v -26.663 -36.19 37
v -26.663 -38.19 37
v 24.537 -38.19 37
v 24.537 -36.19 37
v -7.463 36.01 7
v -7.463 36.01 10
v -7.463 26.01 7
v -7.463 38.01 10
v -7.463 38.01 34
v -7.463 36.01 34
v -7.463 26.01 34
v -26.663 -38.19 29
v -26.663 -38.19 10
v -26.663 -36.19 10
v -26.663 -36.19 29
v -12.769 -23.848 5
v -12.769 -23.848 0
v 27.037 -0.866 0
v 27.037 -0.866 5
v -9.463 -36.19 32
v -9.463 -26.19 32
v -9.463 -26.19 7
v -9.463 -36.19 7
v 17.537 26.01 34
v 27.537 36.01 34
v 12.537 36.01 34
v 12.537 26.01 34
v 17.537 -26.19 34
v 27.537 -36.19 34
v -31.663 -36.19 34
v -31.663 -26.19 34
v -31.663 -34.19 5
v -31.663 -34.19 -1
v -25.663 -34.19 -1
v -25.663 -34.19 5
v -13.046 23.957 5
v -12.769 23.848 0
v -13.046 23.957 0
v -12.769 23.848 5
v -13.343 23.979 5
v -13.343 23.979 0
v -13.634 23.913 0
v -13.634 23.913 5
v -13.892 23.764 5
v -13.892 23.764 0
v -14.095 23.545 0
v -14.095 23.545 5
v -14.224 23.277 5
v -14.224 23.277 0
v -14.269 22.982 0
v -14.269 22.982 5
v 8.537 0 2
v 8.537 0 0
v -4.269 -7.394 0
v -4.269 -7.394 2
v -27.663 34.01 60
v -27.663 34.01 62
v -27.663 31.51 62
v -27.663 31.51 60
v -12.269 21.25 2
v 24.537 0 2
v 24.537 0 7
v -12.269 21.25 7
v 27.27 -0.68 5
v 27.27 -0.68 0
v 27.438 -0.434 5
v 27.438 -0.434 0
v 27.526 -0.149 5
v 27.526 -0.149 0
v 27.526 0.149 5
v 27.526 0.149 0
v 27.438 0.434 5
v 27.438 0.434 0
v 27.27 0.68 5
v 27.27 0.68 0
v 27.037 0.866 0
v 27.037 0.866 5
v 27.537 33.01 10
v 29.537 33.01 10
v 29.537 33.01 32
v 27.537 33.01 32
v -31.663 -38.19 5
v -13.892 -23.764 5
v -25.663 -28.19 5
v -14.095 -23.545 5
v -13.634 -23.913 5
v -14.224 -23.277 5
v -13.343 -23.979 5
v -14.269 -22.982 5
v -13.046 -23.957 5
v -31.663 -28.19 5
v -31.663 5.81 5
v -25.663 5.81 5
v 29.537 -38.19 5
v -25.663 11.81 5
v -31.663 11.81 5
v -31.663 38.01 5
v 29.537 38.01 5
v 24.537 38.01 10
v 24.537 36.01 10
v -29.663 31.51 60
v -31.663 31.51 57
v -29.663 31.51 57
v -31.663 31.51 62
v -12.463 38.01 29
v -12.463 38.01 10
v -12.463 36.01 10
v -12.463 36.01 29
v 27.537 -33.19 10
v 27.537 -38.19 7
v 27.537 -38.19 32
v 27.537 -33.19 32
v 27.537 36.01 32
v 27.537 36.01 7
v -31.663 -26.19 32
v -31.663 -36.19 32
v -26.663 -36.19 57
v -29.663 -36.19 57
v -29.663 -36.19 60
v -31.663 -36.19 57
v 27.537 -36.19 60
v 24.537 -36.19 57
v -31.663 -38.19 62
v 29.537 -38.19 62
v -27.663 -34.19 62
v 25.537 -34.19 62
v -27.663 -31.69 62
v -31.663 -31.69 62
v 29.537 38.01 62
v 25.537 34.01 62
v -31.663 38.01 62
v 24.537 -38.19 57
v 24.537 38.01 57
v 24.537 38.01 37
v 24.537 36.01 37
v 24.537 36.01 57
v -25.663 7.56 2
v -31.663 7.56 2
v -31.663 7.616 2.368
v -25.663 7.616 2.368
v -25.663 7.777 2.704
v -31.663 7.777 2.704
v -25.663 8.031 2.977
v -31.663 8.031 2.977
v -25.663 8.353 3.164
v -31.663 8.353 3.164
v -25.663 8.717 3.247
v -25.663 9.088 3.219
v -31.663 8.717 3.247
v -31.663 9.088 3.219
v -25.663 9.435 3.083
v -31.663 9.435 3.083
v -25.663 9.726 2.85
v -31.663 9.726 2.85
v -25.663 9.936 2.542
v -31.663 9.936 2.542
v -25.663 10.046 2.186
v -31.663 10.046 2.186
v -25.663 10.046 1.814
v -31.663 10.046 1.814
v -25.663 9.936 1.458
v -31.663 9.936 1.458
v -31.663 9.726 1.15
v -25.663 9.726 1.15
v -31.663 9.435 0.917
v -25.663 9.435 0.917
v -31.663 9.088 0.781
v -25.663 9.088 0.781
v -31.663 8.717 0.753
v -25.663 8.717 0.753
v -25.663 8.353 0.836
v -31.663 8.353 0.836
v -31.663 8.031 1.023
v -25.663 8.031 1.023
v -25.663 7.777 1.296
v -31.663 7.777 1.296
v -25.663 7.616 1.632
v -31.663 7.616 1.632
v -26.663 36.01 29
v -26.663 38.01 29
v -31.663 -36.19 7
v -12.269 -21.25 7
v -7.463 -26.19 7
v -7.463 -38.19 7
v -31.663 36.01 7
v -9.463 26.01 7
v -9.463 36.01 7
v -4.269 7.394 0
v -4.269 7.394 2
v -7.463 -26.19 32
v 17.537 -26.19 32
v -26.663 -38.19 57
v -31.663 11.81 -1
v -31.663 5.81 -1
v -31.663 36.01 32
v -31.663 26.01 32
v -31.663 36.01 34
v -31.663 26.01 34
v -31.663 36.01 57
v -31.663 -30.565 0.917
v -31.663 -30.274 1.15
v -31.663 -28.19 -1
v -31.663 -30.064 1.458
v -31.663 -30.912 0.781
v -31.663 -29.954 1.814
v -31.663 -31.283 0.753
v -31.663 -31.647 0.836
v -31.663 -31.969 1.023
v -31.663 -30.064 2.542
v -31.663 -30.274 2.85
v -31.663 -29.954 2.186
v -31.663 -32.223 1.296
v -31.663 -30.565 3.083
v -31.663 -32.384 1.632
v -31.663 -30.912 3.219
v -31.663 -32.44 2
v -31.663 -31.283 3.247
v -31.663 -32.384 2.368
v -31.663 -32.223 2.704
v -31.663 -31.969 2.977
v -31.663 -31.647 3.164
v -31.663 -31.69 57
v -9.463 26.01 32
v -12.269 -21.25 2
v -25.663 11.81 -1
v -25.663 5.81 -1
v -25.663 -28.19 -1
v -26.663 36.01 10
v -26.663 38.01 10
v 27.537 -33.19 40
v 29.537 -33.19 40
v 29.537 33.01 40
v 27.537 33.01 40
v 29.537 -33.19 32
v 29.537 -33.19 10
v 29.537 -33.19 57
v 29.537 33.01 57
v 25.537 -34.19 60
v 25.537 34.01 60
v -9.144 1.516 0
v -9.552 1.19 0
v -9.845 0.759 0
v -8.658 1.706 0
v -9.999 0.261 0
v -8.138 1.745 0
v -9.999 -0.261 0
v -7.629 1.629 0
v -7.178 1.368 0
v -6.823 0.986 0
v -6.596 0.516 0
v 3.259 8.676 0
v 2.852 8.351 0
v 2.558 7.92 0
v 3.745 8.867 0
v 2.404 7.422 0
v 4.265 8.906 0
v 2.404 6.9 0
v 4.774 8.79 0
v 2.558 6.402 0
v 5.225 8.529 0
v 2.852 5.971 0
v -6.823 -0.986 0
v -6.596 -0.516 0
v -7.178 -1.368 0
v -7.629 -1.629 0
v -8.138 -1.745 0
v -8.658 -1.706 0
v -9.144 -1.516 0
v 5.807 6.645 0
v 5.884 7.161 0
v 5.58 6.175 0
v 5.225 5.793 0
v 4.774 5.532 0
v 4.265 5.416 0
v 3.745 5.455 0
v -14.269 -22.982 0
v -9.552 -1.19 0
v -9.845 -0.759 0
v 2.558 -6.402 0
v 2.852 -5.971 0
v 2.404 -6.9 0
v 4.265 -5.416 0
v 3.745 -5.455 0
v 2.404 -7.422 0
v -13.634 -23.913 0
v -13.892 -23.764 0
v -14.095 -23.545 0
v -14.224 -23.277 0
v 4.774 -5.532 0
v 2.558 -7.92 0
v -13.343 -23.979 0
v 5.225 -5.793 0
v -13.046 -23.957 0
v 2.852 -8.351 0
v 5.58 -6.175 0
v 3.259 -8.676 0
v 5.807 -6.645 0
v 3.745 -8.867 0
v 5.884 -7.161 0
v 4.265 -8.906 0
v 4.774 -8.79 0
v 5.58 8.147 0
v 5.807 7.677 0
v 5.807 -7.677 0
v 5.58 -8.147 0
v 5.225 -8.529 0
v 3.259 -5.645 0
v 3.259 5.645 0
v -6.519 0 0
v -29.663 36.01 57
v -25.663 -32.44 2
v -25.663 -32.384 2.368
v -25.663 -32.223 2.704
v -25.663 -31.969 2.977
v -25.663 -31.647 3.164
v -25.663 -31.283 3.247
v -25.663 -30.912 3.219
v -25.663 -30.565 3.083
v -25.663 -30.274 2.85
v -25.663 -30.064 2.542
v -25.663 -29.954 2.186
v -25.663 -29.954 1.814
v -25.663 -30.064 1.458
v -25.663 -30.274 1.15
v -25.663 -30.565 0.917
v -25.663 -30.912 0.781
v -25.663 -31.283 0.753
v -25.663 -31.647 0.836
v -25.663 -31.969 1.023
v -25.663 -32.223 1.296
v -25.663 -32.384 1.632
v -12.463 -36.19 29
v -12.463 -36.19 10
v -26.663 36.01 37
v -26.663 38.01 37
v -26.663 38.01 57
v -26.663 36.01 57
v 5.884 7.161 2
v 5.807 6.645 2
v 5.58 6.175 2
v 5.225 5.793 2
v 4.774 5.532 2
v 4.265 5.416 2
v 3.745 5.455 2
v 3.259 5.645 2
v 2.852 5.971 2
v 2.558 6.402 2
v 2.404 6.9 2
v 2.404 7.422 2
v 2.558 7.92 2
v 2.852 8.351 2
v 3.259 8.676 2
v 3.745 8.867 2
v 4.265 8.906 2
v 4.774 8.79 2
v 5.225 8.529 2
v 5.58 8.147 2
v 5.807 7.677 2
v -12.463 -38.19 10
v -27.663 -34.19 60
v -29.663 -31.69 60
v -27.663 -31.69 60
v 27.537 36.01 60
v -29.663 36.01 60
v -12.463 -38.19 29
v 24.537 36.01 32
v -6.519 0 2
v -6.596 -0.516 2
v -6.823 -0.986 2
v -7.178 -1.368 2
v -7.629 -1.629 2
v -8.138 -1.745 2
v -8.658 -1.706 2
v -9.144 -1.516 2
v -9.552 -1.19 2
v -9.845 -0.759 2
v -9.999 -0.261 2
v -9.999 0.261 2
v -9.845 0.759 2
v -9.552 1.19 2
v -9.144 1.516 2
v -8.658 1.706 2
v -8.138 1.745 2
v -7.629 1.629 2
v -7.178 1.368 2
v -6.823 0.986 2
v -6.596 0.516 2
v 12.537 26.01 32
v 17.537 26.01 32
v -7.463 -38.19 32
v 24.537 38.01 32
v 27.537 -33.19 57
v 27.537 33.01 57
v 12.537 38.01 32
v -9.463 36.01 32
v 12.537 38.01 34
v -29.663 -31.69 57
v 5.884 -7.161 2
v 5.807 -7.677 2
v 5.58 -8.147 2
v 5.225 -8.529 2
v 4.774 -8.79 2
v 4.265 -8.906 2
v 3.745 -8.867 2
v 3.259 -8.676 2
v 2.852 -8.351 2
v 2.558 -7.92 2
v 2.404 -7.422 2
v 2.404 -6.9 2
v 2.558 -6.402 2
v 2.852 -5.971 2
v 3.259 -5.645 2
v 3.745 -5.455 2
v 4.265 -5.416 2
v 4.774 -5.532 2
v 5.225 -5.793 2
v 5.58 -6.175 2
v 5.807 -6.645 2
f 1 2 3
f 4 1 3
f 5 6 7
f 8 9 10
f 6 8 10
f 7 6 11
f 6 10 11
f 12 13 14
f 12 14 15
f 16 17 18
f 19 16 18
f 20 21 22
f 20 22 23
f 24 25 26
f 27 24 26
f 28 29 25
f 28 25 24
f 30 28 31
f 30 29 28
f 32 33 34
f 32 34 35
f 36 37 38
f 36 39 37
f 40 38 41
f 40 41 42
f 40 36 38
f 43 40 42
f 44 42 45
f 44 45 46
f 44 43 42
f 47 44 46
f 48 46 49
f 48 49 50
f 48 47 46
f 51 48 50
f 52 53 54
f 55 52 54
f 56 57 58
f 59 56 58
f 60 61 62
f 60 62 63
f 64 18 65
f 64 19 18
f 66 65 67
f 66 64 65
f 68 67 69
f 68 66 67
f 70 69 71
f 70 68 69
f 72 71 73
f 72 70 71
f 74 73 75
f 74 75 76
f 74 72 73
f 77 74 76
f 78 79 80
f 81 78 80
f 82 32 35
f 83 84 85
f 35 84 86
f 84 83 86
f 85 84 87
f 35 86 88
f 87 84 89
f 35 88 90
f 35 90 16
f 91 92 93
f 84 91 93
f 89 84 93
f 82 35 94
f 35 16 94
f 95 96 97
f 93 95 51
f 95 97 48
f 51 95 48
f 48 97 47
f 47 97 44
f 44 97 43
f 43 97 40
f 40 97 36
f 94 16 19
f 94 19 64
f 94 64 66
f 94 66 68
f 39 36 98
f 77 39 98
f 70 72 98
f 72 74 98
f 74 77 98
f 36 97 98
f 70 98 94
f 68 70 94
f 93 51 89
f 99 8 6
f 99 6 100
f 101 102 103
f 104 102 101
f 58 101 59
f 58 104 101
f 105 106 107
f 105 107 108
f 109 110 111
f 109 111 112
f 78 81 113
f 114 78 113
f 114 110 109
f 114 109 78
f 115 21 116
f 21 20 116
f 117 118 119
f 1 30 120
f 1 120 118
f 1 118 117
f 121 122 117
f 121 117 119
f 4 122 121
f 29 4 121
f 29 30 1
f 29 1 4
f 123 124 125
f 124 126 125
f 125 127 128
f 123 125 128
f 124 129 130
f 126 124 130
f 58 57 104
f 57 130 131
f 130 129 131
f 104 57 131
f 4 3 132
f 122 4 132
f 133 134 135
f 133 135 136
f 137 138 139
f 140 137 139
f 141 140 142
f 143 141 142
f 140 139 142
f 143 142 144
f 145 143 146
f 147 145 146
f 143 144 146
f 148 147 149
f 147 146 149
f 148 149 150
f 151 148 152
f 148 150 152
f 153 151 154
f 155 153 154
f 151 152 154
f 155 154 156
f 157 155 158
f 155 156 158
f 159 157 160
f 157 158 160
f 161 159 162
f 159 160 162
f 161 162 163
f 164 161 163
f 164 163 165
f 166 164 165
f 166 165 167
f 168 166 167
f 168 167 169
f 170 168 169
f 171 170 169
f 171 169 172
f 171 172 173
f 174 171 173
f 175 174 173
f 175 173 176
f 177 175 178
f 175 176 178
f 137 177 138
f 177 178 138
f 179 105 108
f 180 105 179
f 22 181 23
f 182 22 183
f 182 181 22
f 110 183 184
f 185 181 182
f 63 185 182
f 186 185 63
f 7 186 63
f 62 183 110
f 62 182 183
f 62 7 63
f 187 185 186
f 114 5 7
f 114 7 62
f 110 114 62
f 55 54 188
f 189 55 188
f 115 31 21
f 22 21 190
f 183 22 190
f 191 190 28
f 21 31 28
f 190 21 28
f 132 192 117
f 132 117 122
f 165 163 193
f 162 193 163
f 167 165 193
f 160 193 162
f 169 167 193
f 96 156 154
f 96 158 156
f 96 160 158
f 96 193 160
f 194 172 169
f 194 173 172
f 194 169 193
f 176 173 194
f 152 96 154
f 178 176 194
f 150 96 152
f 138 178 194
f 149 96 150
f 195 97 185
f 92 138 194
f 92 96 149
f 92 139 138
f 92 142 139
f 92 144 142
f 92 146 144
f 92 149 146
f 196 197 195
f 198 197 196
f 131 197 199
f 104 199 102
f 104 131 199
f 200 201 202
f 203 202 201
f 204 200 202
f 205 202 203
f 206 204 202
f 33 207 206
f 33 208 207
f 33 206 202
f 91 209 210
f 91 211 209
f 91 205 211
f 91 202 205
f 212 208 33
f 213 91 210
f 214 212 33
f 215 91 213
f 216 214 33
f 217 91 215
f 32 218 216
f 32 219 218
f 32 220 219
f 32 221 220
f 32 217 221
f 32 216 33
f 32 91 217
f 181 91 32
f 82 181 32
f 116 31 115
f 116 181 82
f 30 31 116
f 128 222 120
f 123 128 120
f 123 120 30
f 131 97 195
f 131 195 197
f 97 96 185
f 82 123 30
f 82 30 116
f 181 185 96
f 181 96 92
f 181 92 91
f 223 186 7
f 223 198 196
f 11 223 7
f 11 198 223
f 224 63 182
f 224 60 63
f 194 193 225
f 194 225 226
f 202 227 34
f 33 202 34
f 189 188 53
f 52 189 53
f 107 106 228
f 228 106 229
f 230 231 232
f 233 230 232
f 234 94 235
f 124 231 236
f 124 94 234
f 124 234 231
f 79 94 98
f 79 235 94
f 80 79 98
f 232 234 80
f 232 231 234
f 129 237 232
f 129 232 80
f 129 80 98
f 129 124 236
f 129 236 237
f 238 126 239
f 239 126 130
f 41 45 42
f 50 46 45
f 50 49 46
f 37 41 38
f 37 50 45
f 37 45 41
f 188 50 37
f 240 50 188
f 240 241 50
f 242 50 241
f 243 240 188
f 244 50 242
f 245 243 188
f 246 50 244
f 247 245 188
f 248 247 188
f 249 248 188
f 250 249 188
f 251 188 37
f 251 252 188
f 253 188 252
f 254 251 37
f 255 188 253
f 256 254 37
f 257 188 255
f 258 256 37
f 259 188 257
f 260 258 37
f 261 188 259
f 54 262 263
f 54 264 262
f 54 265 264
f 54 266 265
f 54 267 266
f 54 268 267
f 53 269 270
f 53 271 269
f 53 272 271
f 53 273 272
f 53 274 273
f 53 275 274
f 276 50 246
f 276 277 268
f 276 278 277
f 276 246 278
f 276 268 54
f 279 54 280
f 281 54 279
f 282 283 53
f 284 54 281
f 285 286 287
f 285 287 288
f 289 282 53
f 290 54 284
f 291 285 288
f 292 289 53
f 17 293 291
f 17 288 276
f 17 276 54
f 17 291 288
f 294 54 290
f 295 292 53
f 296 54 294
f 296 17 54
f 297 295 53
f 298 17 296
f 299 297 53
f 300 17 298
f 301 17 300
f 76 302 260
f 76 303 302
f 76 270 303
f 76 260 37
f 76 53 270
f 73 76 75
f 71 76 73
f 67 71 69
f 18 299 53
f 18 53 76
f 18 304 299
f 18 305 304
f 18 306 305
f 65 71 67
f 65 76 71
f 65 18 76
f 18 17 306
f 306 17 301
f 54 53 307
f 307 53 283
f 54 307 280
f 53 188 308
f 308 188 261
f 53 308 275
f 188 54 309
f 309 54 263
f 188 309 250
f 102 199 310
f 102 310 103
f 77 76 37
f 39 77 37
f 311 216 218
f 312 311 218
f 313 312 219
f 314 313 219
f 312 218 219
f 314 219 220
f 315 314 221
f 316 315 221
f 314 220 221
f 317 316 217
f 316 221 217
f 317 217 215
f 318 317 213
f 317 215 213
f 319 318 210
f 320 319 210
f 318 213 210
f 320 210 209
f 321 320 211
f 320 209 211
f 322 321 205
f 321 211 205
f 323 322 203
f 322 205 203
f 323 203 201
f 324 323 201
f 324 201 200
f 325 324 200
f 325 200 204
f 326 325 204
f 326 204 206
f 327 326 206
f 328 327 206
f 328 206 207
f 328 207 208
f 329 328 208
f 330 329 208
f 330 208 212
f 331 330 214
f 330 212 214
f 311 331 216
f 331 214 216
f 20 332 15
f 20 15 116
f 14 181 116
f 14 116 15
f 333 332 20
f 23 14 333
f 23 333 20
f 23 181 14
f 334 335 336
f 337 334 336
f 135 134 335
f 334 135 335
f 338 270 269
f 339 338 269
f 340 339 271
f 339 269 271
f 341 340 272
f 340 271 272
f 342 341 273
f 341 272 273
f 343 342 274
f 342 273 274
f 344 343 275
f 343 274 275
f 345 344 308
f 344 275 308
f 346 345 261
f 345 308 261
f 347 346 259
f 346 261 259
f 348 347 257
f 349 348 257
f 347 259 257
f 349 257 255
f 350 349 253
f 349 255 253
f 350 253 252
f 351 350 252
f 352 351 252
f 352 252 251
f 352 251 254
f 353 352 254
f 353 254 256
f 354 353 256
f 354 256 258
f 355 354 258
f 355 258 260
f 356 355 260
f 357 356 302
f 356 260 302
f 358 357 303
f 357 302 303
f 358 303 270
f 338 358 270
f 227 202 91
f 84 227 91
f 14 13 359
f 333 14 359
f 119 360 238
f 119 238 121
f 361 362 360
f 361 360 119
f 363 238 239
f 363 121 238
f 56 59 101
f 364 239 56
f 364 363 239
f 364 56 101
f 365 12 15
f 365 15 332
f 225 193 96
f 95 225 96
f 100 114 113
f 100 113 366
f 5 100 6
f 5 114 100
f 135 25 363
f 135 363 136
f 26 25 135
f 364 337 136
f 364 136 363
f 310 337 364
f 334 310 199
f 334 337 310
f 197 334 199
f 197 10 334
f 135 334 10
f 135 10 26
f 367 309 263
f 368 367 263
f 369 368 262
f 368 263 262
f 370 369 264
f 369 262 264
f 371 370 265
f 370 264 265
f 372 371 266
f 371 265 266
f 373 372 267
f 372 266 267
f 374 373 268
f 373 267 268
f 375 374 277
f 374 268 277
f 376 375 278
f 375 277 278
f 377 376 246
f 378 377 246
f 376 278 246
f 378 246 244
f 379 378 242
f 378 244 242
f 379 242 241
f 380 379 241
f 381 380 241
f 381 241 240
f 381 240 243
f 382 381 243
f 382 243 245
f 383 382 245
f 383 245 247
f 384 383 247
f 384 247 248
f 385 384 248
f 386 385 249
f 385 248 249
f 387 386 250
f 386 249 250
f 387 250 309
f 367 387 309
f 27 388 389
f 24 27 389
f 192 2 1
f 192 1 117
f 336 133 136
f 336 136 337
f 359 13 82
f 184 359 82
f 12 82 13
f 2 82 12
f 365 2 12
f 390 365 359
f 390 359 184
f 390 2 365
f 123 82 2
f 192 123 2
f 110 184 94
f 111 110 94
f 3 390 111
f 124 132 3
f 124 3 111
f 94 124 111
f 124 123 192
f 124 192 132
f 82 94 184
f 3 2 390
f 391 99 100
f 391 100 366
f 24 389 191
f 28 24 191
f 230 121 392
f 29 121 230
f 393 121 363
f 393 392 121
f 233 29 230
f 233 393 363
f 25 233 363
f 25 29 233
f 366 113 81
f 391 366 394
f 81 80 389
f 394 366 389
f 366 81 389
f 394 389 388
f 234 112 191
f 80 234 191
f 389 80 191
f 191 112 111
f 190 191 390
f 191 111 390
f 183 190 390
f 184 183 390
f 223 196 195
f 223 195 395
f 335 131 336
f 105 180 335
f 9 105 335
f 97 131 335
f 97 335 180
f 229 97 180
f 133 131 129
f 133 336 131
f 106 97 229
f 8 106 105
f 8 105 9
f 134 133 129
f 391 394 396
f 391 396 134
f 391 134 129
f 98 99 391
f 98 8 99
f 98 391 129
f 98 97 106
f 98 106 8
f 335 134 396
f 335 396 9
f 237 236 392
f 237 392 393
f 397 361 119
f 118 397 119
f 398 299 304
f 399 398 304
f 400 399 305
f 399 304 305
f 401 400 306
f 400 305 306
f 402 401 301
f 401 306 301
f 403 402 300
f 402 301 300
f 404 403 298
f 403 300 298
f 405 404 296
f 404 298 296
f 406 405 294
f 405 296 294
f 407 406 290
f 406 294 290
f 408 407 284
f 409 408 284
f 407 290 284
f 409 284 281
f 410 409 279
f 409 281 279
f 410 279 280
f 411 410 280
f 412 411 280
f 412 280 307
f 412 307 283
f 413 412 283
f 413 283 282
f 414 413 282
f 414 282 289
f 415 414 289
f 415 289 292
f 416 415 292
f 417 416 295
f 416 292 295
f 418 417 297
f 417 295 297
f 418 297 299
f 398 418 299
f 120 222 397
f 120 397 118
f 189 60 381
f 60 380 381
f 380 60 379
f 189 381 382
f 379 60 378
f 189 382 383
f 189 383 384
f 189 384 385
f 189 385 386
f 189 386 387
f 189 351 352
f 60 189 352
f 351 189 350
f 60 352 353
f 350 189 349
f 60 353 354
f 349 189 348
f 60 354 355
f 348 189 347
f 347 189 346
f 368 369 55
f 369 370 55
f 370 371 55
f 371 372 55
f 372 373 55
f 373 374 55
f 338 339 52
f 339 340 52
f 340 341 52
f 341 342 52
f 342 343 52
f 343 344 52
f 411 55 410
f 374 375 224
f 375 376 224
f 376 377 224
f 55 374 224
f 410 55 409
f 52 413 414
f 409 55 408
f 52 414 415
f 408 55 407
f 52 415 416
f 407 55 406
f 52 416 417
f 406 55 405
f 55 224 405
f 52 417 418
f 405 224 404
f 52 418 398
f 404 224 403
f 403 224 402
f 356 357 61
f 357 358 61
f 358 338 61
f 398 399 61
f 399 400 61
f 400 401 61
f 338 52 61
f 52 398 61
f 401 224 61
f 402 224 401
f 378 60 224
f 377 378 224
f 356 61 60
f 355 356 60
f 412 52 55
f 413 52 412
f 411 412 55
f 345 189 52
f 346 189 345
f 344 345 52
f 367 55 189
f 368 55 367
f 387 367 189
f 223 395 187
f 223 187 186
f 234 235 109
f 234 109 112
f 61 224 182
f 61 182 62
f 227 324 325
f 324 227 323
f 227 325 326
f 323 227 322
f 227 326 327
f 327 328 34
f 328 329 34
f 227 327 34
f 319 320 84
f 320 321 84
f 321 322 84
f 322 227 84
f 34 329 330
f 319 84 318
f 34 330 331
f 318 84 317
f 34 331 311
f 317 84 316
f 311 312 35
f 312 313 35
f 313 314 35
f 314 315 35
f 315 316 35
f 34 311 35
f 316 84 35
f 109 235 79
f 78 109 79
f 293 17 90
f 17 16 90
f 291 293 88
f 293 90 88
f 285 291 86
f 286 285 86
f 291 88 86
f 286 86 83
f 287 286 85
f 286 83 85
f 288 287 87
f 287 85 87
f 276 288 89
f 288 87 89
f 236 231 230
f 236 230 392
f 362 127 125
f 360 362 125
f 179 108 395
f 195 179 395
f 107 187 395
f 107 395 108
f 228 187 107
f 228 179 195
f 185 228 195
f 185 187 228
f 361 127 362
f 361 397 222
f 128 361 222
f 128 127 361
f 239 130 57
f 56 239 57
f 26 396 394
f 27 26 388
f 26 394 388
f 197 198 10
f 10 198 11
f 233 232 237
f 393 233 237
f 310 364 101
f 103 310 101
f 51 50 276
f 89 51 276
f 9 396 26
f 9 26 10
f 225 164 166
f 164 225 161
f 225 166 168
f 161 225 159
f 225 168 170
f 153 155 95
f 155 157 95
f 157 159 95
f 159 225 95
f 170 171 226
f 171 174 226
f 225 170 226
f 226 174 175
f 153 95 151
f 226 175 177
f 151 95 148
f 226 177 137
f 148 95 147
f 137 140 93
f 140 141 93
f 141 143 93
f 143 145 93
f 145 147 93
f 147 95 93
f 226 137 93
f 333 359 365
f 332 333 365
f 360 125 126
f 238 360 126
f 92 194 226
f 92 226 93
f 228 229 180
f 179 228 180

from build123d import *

# Parameters (mm, degrees)
PAD_DEPTH       = 5
FILLET_R        = 1
FILLET001_R     = 1
FILLET002_R     = 1
SKETCH001_R     = 1.75
PAD001_DEPTH    = 2
SKETCH002_W     = 61.2
SKETCH002_H     = 76.2
PAD002_DEPTH    = 2
PAD003_DEPTH    = 55
SKETCH004_W     = 35
SKETCH004_H     = 25
SKETCH004_W_2   = 14.2
SKETCH004_H_2   = 19
SKETCH004_W_3   = 51.2
SKETCH004_H_3   = 20
POCKET_DEPTH    = 2
SKETCH005_W     = 14.2
SKETCH005_H     = 19
SKETCH005_W_2   = 51.2
SKETCH005_H_2   = 20
POCKET001_DEPTH = 2
SKETCH006_W     = 66.2
SKETCH006_H     = 22
SKETCH006_H_2   = 17
POCKET002_DEPTH = 2
SKETCH007_W     = 24.2
SKETCH007_H     = 10
SKETCH007_W_2   = 31.5
SKETCH007_H_2   = 12
SKETCH007_R     = 1.25
PAD004_DEPTH    = 2
SKETCH008_W     = 31.5
SKETCH008_H     = 2
PAD005_DEPTH    = 3
PAD006_DEPTH    = 2
SKETCH010_W     = 5
SKETCH010_H     = 3
PAD007_DEPTH    = 2
SKETCH011_W     = 6
SKETCH011_H     = 6
SKETCH011_R     = 1.25
PAD008_DEPTH    = 6
SKETCH012_W     = 2
SKETCH012_H     = 10
PAD009_DEPTH    = 25
SKETCH013_W     = 31.5
SKETCH013_H     = 76.2
POCKET003_DEPTH = 6
SKETCH014_W     = 4
SKETCH014_H     = 5
POCKET004_DEPTH = 0.5
SKETCH015_W     = 4
SKETCH015_H     = 5
POCKET005_DEPTH = 0.5


with BuildPart() as part:
    # Sketch → Pad (new body)
    with BuildSketch(Plane.XY):
        Polygon((28.537386, 0), (-14.268693, 24.714102), (-14.268693, -24.714102), align=None)
        Polygon((24.537386, 0), (-12.268693, 21.25), (-12.268693, -21.25), align=None, mode=Mode.SUBTRACT)
    extrude(amount=PAD_DEPTH)

    # Fillet
    fillet_edges = [part.edges().sort_by_distance(p)[0] for p in [
        (-14.268693, -24.714102, 2.5),
    ]]
    fillet(fillet_edges, radius=FILLET_R)

    # Fillet001
    fillet001_edges = [part.edges().sort_by_distance(p)[0] for p in [
        (28.537386, 0, 2.5),
    ]]
    fillet(fillet001_edges, radius=FILLET001_R)

    # Fillet002
    fillet002_edges = [part.edges().sort_by_distance(p)[0] for p in [
        (-14.268693, 24.714102, 2.5),
    ]]
    fillet(fillet002_edges, radius=FILLET002_R)

    # Sketch001 (on Face1 of Fillet002) → Pad001 (join)
    with BuildSketch(Plane(origin=(0, 0, 0), x_dir=(1, 0, 0), z_dir=(0, 0, -1))):
        Polygon((24.537386, 0), (-12.268693, 21.25), (-12.268693, -21.25), align=None)
        with Locations((4.134347, 7.160898)):
            Circle(SKETCH001_R, mode=Mode.SUBTRACT)
        with Locations((4.134347, -7.160898)):
            Circle(SKETCH001_R, mode=Mode.SUBTRACT)
        with Locations((-8.268693, 0)):
            Circle(SKETCH001_R, mode=Mode.SUBTRACT)
        Polygon((8.537386, 0), (-4.268693, 7.393594), (-4.268693, -7.393594), align=None, mode=Mode.SUBTRACT)
    extrude(amount=-PAD001_DEPTH)

    # Sketch002 (on Face9 of Pad001) → Pad002 (join)
    with BuildSketch(Plane.XY.offset(5)):
        with Locations((-1.062614, -0.09)):
            Rectangle(SKETCH002_W, SKETCH002_H)
        Polygon((-12.268693, 21.25), (-12.268693, -21.25), (24.537386, 0), align=None, mode=Mode.SUBTRACT)
    extrude(amount=PAD002_DEPTH)

    # Sketch003 (on Face21 of Pad002) → Pad003 (join)
    with BuildSketch(Plane.XY.offset(7)):
        Polygon((-31.662614, 38.01), (29.537386, 38.01), (29.537386, -38.19), (-31.662614, -38.19), (-31.662614, -36.19), (27.537386, -36.19), (27.537386, 36.01), (-31.662614, 36.01), align=None)
    extrude(amount=PAD003_DEPTH)

    # Sketch004 (on Face26 of Pad003) → Pocket (cut)
    with BuildSketch(Plane.XZ.offset(38.19)):
        with Locations((10.037386, 19.5)):
            Rectangle(SKETCH004_W, SKETCH004_H)
        with Locations((-19.562614, 19.5)):
            Rectangle(SKETCH004_W_2, SKETCH004_H_2)
        with Locations((-1.062614, 47)):
            Rectangle(SKETCH004_W_3, SKETCH004_H_3)
    extrude(amount=-POCKET_DEPTH, mode=Mode.SUBTRACT)

    # Sketch005 (on Face21 of Pocket) → Pocket001 (cut)
    with BuildSketch(Plane(origin=(0, 38.01, 0), x_dir=(-1, 0, 0), z_dir=(0, 1, 0))):
        Polygon((-24.537386, 32), (-12.537386, 32), (-12.537386, 34), (7.462614, 34), (7.462614, 32), (7.462614, 10), (-24.537386, 10), align=None)
        with Locations((19.562614, 19.5)):
            Rectangle(SKETCH005_W, SKETCH005_H)
        with Locations((1.062614, 47)):
            Rectangle(SKETCH005_W_2, SKETCH005_H_2)
    extrude(amount=-POCKET001_DEPTH, mode=Mode.SUBTRACT)

    # Sketch006 (on Face25 of Pocket001) → Pocket002 (cut)
    with BuildSketch(Plane.YZ.offset(29.537386)):
        with Locations((-0.09, 21)):
            Rectangle(SKETCH006_W, SKETCH006_H)
        with Locations((-0.09, 48.5)):
            Rectangle(SKETCH006_W, SKETCH006_H_2)
    extrude(amount=-POCKET002_DEPTH, mode=Mode.SUBTRACT)

    # Sketch007 (on Face62 of Pocket002) → Pad004 (join)
    with BuildSketch(Plane(origin=(0, 0, 32), x_dir=(1, 0, 0), z_dir=(0, 0, -1))):
        Polygon((-31.662614, 36.19), (27.537386, 36.19), (27.537386, -36.01), (12.537386, -36.01), (12.537386, -26.01), (17.537386, -26.01), (17.537386, 26.19), (-31.662614, 26.19), align=None)
        with Locations((-19.562614, -31.01)):
            Rectangle(SKETCH007_W, SKETCH007_H)
        with Locations((45.287386, -32.01)):
            Rectangle(SKETCH007_W_2, SKETCH007_H_2)
        with Locations((58.037386, -32.91)):
            Circle(SKETCH007_R, mode=Mode.SUBTRACT)
        with Locations((32.037386, -32.91)):
            Circle(SKETCH007_R, mode=Mode.SUBTRACT)
        with Locations((45.287386, 32.19)):
            Rectangle(SKETCH007_W_2, SKETCH007_H_2)
        with Locations((32.037386, 33.09)):
            Circle(SKETCH007_R, mode=Mode.SUBTRACT)
        with Locations((58.037386, 33.09)):
            Circle(SKETCH007_R, mode=Mode.SUBTRACT)
    extrude(amount=-PAD004_DEPTH)

    # Sketch008 (on Face78 of Pad004) → Pad005 (join, symmetric)
    with BuildSketch(Plane.XY.offset(34)):
        with Locations((45.287386, 37.01)):
            Rectangle(SKETCH008_W, SKETCH008_H)
        with Locations((45.287386, -37.19)):
            Rectangle(SKETCH008_W, SKETCH008_H)
    extrude(amount=PAD005_DEPTH, both=True)

    # Sketch009 (on Face31 of Pad005) → Pad006 (join)
    with BuildSketch(Plane.XY.offset(62)):
        Polygon((-31.662614, 36.01), (27.537386, 36.01), (27.537386, -36.19), (-31.662614, -36.19), (-31.662614, -34.19), (-31.662614, -31.19), (-27.662614, -31.19), (-27.662614, -34.19), (25.537386, -34.19), (25.537386, 34.01), (-27.662614, 34.01), (-27.662614, 31.01), (-31.662614, 31.01), (-31.662614, 34.01), align=None)
    extrude(amount=-PAD006_DEPTH)

    # Sketch010 (on Face24 of Pad006) → Pad007 (join)
    with BuildSketch(Plane(origin=(-31.662614, 0, 0), x_dir=(0, -1, 0), z_dir=(-1, 0, 0))):
        with Locations((-33.51, 58.5)):
            Rectangle(SKETCH010_W, SKETCH010_H)
        with Locations((33.69, 58.5)):
            Rectangle(SKETCH010_W, SKETCH010_H)
    extrude(amount=-PAD007_DEPTH)

    # Sketch011 (on Face17 of Pad007) → Pad008 (join)
    with BuildSketch(Plane(origin=(-31.662614, 0, 0), x_dir=(0, -1, 0), z_dir=(-1, 0, 0))):
        with Locations((31.19, 2)):
            Rectangle(SKETCH011_W, SKETCH011_H)
        with Locations((31.19, 2)):
            Circle(SKETCH011_R, mode=Mode.SUBTRACT)
        with Locations((-8.81, 2)):
            Rectangle(SKETCH011_W, SKETCH011_H)
        with Locations((-8.81, 2)):
            Circle(SKETCH011_R, mode=Mode.SUBTRACT)
    extrude(amount=-PAD008_DEPTH)

    # Sketch012 (on Face119 of Pad008) → Pad009 (join)
    with BuildSketch(Plane(origin=(0, 0, 32), x_dir=(1, 0, 0), z_dir=(0, 0, -1))):
        with Locations((-8.462614, 31.19)):
            Rectangle(SKETCH012_W, SKETCH012_H)
        with Locations((-8.462614, -31.01)):
            Rectangle(SKETCH012_W, SKETCH012_H)
    extrude(amount=PAD009_DEPTH)

    # Sketch013 (on Face117 of Pad009) → Pocket003 (cut)
    with BuildSketch(Plane.XY.offset(37)):
        with Locations((45.287386, -0.09)):
            Rectangle(SKETCH013_W, SKETCH013_H)
    extrude(amount=-POCKET003_DEPTH, mode=Mode.SUBTRACT)

    # Sketch014 (on Face126 of Pocket003) → Pocket004 (cut)
    with BuildSketch(Plane.XZ.offset(-31.01)):
        with Locations((-29.662614, 59.5)):
            Rectangle(SKETCH014_W, SKETCH014_H)
    extrude(amount=-POCKET004_DEPTH, mode=Mode.SUBTRACT)

    # Sketch015 (on Face126 of Pocket004) → Pocket005 (cut)
    with BuildSketch(Plane(origin=(0, -31.19, 0), x_dir=(-1, 0, 0), z_dir=(0, 1, 0))):
        with Locations((29.662614, 59.5)):
            Rectangle(SKETCH015_W, SKETCH015_H)
    extrude(amount=-POCKET005_DEPTH, mode=Mode.SUBTRACT)


solid = part.part
